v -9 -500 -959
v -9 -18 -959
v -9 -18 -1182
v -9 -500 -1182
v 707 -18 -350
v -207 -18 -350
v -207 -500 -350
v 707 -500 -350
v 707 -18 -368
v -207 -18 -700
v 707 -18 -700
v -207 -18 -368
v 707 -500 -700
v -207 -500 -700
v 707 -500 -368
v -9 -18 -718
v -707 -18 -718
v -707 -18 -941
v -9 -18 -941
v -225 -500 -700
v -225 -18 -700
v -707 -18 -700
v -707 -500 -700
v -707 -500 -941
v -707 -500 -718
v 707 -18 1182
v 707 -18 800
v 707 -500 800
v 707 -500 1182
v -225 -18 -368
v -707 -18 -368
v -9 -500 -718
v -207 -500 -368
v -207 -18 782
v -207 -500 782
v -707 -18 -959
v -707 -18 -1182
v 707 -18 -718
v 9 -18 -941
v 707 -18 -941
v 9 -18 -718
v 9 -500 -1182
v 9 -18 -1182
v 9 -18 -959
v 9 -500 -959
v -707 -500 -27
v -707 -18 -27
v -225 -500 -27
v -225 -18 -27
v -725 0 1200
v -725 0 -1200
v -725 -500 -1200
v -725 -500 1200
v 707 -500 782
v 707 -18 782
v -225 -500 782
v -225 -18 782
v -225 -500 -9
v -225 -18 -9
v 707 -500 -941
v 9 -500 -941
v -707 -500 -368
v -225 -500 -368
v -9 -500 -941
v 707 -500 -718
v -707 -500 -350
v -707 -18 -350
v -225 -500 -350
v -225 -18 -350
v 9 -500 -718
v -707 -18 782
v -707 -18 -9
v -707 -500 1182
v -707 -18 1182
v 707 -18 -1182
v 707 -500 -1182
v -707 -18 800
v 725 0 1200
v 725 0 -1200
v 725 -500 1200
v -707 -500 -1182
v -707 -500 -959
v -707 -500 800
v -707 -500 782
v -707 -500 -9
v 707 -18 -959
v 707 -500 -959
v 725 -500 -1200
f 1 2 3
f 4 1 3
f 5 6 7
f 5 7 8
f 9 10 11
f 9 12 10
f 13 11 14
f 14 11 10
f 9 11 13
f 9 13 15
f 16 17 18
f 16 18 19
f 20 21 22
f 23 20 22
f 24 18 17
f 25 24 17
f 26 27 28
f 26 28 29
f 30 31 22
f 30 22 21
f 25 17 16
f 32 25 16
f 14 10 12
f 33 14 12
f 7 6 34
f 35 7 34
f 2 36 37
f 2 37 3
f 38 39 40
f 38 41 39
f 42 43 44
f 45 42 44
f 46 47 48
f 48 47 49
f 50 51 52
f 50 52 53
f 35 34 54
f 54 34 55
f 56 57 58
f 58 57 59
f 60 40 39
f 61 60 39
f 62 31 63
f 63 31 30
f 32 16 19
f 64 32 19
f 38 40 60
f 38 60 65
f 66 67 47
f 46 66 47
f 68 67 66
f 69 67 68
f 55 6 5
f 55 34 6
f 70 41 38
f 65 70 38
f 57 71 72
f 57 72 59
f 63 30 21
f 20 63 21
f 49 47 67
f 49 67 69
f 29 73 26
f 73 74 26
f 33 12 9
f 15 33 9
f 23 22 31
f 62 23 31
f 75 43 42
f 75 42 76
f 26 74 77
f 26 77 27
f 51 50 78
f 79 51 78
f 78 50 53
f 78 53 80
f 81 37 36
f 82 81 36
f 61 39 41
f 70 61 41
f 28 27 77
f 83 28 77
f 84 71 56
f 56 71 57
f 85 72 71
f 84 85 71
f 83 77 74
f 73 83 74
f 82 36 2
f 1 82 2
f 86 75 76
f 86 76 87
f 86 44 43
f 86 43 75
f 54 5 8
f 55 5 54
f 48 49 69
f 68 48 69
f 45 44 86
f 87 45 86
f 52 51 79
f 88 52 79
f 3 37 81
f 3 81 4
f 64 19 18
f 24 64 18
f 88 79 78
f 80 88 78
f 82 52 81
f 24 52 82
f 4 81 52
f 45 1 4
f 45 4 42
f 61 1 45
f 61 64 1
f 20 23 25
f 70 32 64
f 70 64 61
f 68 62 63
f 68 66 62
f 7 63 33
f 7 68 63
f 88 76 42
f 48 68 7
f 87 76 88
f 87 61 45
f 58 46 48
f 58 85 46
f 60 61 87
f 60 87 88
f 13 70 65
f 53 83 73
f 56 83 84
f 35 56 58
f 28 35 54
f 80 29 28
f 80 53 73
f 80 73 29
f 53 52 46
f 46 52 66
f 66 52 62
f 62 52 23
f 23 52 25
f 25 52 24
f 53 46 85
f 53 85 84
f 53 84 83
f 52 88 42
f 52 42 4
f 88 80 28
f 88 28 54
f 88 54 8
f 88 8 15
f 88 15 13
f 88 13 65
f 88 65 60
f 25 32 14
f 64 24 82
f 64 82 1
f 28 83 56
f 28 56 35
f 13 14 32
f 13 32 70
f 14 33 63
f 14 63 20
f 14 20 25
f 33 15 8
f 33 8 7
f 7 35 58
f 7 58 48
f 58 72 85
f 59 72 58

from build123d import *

# Parameters (mm, degrees)
F0_W     = 1450
F0_H     = 2400
F1_DEPTH = 500
F2_T     = -18
F4_DEPTH = 482
F5_W     = 1414.227886
F5_H     = 18
F5_W_2   = 482
F6_DEPTH = 482


with BuildPart() as f1:
    # F0 (on Front) → F1 (new body)
    with BuildSketch(Plane.XZ):
        Rectangle(F0_W, F0_H)
    extrude(amount=F1_DEPTH)

    # F2
    f2_openings = [f1.faces().sort_by_distance(p)[0] for p in [
        (0, -500, 0),
    ]]
    offset(amount=F2_T, openings=f2_openings)

    # F3 (on face) → F4 (join)
    with BuildSketch(Plane.XZ.offset(18)):
        Polygon((707, 800), (-707, 800), (-707, 782), (-225, 782), (-225, -700), (-707, -700), (-707, -718), (-9, -718), (-9, -941), (-707, -941), (-707, -959), (-9, -959), (-9, -1182), (9, -1182), (9, -959), (707, -959), (707, -941), (9, -941), (9, -718), (707, -718), (707, -700), (-207, -700), (-207, 782), (707, 782), align=None)
    extrude(amount=F4_DEPTH)

    # F5 (on face) → F6 (join)
    with BuildSketch(Plane.XZ.offset(18)):
        with Locations((0.113943, -359)):
            Rectangle(F5_W, F5_H)
        with Locations((-466, -18)):
            Rectangle(F5_W_2, F5_H)
    extrude(amount=F6_DEPTH)


solid = f1.part
